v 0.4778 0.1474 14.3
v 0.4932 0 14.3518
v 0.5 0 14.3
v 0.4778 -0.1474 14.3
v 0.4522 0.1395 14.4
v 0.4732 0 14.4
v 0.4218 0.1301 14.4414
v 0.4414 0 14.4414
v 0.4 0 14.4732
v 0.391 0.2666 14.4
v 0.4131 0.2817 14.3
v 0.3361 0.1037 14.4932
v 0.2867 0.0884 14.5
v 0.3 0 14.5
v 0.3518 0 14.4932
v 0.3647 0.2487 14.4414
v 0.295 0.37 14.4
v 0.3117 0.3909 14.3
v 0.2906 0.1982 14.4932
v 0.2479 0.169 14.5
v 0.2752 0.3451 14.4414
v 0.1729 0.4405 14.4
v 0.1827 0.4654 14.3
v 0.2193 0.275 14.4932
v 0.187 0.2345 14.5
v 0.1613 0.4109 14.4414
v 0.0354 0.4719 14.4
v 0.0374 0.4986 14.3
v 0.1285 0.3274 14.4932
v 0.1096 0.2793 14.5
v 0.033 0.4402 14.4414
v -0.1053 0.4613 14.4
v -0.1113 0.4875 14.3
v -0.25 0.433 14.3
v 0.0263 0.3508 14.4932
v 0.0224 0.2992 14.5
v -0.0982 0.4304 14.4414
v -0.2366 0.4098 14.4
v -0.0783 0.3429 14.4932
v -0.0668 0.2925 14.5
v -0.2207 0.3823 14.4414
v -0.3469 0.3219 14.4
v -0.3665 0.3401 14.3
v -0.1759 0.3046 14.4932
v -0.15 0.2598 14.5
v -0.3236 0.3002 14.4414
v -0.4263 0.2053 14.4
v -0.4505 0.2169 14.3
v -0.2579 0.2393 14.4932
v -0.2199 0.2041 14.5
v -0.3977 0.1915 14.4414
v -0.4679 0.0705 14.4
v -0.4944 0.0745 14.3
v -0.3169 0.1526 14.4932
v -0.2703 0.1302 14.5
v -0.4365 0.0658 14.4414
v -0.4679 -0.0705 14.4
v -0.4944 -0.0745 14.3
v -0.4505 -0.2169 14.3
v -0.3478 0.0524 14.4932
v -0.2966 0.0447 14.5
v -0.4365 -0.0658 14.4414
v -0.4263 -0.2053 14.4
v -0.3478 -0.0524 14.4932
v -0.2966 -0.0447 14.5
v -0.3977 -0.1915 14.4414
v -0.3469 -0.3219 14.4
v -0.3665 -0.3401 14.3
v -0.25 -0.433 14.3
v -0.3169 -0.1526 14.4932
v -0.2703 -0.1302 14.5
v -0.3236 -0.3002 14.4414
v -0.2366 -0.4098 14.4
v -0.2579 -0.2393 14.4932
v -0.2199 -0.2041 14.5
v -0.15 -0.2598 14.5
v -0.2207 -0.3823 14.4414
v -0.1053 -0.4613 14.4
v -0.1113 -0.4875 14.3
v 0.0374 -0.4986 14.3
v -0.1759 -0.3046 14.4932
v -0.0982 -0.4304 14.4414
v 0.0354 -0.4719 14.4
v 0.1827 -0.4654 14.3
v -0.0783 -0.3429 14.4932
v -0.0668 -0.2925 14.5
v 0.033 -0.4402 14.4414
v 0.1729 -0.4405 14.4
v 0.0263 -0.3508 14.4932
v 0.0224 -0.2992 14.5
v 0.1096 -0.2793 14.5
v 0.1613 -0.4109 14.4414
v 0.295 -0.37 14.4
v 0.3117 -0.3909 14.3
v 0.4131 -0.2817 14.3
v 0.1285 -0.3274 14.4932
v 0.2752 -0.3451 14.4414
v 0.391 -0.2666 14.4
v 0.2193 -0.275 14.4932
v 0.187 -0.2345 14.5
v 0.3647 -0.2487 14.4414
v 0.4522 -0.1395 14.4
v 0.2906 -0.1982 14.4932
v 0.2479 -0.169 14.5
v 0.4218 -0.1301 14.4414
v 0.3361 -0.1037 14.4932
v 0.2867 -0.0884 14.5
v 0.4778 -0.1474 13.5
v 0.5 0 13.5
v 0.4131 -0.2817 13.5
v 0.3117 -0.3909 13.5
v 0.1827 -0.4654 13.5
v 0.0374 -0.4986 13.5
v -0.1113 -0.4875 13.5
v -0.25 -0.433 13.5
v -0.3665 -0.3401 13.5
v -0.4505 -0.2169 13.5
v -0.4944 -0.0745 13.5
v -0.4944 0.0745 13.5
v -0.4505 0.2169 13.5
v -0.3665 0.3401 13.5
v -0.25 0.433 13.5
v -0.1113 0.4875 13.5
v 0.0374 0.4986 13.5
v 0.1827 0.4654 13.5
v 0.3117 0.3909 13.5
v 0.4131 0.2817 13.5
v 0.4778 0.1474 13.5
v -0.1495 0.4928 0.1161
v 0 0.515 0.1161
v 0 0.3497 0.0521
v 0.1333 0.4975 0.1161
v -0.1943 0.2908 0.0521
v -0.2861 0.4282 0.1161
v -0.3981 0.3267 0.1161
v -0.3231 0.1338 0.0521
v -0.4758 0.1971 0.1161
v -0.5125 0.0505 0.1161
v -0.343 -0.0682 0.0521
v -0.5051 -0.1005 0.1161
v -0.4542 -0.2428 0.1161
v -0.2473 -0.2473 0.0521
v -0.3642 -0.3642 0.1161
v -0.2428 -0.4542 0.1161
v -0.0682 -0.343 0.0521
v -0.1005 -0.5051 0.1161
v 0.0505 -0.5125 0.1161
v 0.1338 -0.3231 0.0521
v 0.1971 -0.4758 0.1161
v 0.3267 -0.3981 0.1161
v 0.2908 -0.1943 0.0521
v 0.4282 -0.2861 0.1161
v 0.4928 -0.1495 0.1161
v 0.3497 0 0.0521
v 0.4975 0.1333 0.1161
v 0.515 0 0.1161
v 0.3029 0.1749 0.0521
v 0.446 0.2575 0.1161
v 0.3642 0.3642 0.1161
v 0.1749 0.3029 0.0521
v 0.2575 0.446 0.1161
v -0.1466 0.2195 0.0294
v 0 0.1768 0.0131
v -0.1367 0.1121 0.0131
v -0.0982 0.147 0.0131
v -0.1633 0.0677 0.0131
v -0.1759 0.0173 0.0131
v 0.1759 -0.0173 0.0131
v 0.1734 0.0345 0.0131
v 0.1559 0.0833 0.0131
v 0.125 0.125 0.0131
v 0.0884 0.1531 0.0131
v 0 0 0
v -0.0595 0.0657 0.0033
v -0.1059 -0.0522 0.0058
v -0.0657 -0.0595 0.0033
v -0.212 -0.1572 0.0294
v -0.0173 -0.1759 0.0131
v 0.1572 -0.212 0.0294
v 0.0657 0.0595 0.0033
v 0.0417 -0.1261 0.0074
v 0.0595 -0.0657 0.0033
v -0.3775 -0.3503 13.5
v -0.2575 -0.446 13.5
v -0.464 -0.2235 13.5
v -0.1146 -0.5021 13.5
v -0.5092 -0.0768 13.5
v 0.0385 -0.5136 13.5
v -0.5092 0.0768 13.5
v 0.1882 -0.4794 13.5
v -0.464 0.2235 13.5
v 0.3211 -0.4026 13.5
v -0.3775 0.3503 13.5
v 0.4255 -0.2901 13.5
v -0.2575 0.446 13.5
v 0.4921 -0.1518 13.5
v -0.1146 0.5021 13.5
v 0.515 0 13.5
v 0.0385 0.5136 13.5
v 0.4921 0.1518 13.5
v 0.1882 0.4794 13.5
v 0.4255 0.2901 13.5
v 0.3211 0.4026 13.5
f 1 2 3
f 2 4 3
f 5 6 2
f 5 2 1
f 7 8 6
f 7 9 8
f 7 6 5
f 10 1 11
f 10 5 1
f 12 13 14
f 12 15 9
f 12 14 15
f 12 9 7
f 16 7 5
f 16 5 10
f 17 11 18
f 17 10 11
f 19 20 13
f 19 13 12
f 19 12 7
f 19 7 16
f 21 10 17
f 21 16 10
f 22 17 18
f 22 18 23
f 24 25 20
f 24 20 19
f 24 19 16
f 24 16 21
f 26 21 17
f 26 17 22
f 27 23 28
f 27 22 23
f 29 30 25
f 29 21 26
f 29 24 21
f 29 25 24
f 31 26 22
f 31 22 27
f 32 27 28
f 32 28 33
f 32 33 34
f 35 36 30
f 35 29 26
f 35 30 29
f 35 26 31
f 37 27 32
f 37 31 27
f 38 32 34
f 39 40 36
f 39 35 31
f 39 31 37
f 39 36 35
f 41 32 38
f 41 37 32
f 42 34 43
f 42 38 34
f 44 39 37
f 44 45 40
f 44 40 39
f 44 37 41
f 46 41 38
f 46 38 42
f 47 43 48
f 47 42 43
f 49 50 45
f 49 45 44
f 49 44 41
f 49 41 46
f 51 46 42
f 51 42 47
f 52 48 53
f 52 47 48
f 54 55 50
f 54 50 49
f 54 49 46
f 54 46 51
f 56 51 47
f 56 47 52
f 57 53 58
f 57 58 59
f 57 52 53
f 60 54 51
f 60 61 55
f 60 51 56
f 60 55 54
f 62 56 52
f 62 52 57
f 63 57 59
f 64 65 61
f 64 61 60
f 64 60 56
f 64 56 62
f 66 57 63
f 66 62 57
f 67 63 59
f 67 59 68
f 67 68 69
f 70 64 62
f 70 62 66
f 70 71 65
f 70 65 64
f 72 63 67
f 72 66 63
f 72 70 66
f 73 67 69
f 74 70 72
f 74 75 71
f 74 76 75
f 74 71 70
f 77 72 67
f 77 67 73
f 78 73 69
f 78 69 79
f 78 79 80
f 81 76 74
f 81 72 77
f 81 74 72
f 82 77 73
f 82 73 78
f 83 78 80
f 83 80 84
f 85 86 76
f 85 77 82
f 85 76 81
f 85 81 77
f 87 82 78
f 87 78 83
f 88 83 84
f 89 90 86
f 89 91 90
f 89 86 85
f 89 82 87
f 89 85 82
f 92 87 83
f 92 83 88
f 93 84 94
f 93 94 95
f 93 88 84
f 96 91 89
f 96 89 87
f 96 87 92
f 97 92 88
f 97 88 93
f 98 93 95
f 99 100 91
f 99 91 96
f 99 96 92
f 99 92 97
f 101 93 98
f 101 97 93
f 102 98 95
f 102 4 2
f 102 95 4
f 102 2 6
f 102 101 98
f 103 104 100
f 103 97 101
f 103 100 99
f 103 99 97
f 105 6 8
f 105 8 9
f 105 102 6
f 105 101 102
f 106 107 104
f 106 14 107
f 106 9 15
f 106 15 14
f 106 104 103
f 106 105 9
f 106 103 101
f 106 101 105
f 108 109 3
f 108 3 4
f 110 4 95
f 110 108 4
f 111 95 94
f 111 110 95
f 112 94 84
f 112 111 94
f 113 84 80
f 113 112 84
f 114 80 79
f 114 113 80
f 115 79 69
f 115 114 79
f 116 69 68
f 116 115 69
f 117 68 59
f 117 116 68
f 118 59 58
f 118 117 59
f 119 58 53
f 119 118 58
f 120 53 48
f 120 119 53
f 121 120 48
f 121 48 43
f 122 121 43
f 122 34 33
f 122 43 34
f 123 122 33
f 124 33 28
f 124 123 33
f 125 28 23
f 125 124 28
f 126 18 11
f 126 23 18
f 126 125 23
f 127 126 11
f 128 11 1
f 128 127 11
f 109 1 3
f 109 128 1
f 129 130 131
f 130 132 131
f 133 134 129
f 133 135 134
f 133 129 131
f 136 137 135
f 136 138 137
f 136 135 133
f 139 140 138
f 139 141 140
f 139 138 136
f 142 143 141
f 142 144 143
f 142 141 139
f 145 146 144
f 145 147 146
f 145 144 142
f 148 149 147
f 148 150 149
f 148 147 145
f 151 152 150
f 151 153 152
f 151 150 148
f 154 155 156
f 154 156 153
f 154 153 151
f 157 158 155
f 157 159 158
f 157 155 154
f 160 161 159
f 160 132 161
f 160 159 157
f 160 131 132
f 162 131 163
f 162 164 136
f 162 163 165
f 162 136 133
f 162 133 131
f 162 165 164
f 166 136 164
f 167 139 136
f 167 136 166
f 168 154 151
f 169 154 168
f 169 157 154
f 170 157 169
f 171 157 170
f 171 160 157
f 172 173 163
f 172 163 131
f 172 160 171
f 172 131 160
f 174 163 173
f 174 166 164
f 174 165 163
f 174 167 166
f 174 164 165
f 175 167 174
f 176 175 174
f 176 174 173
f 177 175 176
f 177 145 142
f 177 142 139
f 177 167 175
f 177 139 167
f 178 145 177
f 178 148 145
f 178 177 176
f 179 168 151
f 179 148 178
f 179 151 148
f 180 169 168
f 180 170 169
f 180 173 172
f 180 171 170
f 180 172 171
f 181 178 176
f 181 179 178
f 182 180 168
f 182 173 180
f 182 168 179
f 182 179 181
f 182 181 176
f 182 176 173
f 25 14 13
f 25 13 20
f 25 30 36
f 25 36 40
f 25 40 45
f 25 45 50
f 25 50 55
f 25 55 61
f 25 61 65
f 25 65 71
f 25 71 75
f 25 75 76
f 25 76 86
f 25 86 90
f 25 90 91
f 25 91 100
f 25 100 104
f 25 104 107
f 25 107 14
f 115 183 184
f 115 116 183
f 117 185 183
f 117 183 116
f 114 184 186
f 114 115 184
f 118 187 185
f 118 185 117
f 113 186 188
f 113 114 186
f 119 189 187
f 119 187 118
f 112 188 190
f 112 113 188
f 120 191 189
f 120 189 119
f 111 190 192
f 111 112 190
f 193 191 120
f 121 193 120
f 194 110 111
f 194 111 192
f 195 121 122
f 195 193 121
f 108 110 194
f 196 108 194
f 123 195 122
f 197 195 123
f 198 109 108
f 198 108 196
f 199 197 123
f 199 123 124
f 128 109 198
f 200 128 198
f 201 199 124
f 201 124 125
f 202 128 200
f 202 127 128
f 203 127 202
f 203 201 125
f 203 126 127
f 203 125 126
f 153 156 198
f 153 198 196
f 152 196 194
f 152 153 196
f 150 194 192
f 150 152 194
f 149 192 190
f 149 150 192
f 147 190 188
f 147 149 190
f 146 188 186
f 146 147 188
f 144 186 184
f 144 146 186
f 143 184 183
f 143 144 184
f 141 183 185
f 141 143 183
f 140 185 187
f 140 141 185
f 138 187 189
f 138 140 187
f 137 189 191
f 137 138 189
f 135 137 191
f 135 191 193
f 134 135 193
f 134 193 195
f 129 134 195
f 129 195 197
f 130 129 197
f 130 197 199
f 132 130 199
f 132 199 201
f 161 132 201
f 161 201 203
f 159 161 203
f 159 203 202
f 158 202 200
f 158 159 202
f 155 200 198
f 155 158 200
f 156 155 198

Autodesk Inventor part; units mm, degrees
ref_plane "YZ Plane" through (0, 0, 0) normal (1, 0, 0) x (0, 1, 0)
ref_plane "XZ Plane" through (0, 0, 0) normal (0, 1, 0) x (-1, 0, 0)
sketch "Sketch1" plane through (0, 0, 0) normal (0, 0, 1) x (1, 0, 0)
  circle A0 centre (0, 0) radius 0.515
  dimension "d0" = 1.03
extrude "Extrusion1" add sketch "Sketch1" along normal blind 13.5
thread "Thread1" size "110-102 UNM" class "2A" standard "ANSI Unified Screw Threads" full length
sketch "Sketch2" plane through (0, 0, 0) normal (1, 0, 0) x (0, 1, 0)
  line L0 (-0.515, 13.5) -> (0.515, 13.5) projected
  line L1 (-0.515, 0) -> (-0.515, 13.5) projected
  line L2 (0.515, 0) -> (0.515, 13.5) projected
  arc A0 (0, 0) -> (0.515, 0.1161) centre (0, 1.2) ccw
  line L3 (-0.515, 0) -> (0.515, 0) projected
  line L4 (0.515, 0.1161) -> (0.515, 0)
  line L5 (0, 0) -> (0.515, 0)
  line L6 (0, -2.9344) -> (0, 17.4057) projected
  point P0 (0, 0)
  point P1 (0, 0)
revolve "Revolution1" cut sketch "Sketch2" angle 360 about axis through (0, 0, -10) along (0, 0, 1) contours A0 L2 L3
ref_plane "Work Plane3" through (0, 0, 6.75) normal (0, 0, 1) x (1, 0, 0)
mirror "Mirror1" [suppressed]
ref_plane "Work Plane4" through (0, 0, 13.5) normal (0, 0, 1) x (1, 0, 0)
sketch "Sketch3" plane through (0, 0, 13.5) normal (0, 0, 1) x (1, 0, 0)
  circle A0 centre (0, 0) radius 0.5
  circle A1 centre (0, 0) radius 0.515 projected
  dimension "d12" = 1
extrude "Extrusion2" [suppressed]
sketch "Sketch4" plane through (0, 0, 13.5) normal (0, 0, 1) x (1, 0, 0)
  circle A0 centre (0, 0) radius 0.5
  dimension "d15" = 1
extrude "Extrusion3" add sketch "Sketch4" along normal blind 1
fillet "Fillet1" radius 0.2 1 edges at (-0.5, 0, 14.5)
equation "\"d10\" = 0.5 * d1"
equation "\"d11\" = d1"
equation "\"d1\" = 13.5"
properties part number "MU_Motor_Thread_Modified" material "Brass, Soft Yellow"
